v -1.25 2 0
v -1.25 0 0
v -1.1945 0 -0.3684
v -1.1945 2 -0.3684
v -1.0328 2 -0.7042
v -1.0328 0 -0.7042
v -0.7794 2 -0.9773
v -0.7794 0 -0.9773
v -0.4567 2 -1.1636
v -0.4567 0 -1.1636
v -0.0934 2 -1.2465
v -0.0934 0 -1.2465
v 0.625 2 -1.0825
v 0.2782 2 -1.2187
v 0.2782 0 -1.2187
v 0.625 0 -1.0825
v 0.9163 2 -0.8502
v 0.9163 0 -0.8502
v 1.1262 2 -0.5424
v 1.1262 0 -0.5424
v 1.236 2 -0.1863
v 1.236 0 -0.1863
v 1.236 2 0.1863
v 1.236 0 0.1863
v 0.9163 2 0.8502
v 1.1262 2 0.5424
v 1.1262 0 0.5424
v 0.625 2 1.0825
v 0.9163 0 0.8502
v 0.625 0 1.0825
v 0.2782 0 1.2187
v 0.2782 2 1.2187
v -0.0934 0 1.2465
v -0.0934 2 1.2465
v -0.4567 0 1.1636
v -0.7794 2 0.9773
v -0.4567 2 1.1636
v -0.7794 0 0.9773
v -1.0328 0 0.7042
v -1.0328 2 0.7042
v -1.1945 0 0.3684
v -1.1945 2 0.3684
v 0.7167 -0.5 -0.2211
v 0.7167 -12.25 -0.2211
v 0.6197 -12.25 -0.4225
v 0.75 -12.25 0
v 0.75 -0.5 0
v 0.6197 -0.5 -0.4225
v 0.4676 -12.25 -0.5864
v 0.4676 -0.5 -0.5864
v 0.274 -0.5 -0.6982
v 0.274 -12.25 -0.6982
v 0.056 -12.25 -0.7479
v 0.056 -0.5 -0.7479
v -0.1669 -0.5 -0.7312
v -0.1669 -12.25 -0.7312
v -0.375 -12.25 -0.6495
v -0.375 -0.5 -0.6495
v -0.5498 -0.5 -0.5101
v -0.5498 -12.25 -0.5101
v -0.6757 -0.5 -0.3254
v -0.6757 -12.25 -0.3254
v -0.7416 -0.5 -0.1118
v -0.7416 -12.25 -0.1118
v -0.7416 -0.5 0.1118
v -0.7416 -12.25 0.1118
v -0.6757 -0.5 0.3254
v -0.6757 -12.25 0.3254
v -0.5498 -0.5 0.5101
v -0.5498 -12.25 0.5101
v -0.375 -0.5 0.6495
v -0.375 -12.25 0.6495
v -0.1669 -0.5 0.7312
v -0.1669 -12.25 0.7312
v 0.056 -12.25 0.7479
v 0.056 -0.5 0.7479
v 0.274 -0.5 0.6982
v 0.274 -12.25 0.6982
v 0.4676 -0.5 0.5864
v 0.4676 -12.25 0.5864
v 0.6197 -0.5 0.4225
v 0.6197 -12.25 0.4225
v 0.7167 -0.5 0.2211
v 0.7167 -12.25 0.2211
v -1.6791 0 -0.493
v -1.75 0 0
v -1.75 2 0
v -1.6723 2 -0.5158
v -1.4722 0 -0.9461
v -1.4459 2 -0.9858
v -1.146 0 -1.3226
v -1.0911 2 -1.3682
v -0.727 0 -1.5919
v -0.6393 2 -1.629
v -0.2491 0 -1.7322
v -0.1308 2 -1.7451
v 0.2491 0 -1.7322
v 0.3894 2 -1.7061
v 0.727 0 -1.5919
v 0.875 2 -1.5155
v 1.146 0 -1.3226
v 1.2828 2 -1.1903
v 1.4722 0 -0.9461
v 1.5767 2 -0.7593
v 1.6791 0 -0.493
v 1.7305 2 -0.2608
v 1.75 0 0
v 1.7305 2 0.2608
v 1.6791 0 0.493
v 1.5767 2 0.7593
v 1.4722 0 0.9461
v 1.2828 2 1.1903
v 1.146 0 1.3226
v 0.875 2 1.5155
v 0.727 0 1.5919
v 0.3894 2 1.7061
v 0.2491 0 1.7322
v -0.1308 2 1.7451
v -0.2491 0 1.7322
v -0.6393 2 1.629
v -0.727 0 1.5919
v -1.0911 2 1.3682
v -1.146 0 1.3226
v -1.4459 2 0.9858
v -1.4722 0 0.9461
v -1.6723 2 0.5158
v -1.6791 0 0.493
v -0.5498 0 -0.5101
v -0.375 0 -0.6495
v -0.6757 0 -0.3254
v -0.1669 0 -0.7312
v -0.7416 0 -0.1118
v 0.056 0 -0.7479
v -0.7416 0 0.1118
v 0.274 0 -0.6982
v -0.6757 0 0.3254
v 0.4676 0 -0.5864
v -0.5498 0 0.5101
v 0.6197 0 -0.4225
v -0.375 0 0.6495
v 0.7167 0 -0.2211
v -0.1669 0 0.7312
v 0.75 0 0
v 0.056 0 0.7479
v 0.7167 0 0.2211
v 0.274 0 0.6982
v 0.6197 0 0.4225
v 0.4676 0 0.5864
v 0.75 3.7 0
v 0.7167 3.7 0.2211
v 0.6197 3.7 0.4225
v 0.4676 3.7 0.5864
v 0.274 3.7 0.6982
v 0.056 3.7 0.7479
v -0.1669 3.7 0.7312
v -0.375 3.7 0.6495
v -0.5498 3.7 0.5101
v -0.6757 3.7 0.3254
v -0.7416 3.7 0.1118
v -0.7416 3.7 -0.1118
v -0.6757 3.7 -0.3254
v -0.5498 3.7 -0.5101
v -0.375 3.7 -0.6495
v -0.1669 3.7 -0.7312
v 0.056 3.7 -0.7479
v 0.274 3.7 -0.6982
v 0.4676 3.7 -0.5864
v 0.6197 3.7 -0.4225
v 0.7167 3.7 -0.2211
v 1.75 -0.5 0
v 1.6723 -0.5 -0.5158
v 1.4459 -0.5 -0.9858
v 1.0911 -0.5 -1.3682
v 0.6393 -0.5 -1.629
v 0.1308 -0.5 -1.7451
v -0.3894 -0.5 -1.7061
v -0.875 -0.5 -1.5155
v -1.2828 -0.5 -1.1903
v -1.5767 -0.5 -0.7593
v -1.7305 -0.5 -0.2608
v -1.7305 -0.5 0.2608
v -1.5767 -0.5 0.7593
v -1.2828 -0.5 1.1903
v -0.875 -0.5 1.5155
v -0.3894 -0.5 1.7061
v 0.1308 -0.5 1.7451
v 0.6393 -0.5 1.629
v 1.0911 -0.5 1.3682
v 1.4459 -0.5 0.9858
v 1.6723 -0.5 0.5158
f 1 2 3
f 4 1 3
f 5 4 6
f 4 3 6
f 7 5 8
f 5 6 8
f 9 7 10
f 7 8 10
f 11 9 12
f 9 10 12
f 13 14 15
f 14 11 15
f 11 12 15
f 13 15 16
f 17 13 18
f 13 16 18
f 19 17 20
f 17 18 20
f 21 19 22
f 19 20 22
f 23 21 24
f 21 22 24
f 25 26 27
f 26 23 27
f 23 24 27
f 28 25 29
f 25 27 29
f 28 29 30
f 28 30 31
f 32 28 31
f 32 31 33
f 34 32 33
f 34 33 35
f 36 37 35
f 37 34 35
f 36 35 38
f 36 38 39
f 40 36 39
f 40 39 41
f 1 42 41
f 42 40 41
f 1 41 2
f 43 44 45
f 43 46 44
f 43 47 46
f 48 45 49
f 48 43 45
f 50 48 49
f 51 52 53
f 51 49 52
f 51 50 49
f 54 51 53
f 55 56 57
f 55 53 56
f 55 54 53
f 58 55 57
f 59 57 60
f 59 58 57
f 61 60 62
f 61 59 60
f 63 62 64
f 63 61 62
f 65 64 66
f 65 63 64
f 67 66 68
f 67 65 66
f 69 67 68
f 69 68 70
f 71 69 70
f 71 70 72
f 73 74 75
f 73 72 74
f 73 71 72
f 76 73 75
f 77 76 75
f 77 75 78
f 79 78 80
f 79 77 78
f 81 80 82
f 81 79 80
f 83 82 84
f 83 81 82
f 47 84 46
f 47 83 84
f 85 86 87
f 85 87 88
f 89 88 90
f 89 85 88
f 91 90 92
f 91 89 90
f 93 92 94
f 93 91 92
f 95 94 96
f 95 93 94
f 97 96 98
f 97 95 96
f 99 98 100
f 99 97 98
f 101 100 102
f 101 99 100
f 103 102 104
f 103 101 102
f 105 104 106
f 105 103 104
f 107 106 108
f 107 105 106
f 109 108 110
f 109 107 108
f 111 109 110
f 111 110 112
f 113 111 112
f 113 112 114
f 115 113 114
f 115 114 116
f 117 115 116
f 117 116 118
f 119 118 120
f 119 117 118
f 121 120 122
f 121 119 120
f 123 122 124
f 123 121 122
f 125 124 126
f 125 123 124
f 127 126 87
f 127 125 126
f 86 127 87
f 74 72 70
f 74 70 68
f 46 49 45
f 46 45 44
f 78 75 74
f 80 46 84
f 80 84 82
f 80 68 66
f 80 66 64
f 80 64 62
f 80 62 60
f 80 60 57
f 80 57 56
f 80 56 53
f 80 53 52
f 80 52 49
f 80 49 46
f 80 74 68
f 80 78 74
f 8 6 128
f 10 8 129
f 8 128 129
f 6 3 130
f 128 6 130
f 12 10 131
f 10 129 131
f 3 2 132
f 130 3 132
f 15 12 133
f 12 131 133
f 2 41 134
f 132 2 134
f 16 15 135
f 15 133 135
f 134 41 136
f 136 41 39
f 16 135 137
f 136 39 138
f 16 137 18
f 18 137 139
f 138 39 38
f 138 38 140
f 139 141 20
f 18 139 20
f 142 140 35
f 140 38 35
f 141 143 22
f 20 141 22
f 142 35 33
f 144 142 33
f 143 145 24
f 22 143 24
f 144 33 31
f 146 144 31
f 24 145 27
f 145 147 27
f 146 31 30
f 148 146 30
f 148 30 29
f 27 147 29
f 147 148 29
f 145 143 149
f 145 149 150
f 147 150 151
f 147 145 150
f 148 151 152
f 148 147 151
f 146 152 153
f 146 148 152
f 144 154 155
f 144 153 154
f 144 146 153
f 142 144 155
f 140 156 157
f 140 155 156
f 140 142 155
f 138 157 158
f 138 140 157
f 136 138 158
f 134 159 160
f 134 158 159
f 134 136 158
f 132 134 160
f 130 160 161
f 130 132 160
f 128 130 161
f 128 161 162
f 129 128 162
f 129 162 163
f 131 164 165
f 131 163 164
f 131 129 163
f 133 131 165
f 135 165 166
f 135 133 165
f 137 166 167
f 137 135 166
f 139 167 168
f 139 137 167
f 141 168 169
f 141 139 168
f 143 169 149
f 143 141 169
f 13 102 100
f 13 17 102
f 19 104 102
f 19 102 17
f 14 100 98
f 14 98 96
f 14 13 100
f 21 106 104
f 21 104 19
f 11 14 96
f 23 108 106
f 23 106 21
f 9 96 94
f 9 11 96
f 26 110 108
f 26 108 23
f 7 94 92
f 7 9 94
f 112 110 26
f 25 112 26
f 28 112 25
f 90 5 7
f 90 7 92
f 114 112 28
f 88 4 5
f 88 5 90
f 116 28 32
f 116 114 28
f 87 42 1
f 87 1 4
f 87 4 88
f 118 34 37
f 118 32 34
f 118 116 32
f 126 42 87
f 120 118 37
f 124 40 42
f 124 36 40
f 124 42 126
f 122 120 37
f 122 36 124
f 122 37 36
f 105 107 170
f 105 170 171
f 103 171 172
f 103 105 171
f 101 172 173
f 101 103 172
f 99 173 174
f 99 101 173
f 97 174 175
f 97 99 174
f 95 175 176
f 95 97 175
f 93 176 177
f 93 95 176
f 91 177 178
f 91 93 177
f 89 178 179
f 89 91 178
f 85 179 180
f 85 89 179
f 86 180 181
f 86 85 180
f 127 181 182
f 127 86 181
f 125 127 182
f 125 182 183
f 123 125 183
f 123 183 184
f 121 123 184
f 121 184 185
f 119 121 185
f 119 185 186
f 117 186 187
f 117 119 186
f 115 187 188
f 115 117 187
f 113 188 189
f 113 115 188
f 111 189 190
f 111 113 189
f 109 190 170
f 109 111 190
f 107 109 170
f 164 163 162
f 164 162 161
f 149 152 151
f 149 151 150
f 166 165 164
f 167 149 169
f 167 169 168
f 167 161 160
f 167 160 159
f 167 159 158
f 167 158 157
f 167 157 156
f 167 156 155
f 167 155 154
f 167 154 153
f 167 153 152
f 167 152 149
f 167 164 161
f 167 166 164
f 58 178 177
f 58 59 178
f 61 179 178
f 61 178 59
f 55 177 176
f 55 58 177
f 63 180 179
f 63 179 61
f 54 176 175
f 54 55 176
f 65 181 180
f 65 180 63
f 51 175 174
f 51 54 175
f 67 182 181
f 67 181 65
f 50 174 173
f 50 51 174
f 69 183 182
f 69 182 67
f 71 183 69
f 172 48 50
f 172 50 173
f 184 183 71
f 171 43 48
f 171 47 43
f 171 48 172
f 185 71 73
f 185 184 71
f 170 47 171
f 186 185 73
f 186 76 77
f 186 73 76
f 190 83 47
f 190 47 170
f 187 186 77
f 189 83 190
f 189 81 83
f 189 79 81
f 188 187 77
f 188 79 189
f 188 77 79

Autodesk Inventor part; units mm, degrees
ref_plane "YZ Plane" through (0, 0, 0) normal (1, 0, 0) x (0, 1, 0)
ref_plane "XZ Plane" through (0, 0, 0) normal (0, 1, 0) x (-1, 0, 0)
ref_plane "XY Plane" through (0, 0, 0) normal (0, 0, 1) x (1, 0, 0)
sketch "Sketch1" plane through (0, 0, 0) normal (0, 1, 0) x (-1, 0, 0)
  circle A0 centre (0, 0) radius 1.25
  circle A1 centre (0, 0) radius 1.75
  dimension "d0" = 2.5
  dimension "d1" = 3.5
extrude "Extrusion1" add sketch "Sketch1" along normal blind 2
sketch "Sketch2" plane through (0, 0, 0) normal (0, -1, 0) x (1, 0, 0)
  circle A0 centre (0, 0) radius 1.75
extrude "Extrusion2" add sketch "Sketch2" along normal blind 0.5
sketch "Sketch3" plane through (0, 0, 0) normal (0, 1, 0) x (1, 0, 0)
  circle A0 centre (0, 0) radius 0.75
  dimension "d6" = 1.5
extrude "Extrusion3" add sketch "Sketch3" along normal blind 3.7
sketch "Sketch4" plane through (0, -0.5, 0) normal (0, -1, 0) x (1, 0, 0)
  circle A0 centre (0, 0) radius 0.75 projected
  circle A1 centre (0, 0) radius 0.75
extrude "Extrusion4" add sketch "Sketch4" along normal blind 11.75
properties part number "plunger extension" material "ABS Plastic"
